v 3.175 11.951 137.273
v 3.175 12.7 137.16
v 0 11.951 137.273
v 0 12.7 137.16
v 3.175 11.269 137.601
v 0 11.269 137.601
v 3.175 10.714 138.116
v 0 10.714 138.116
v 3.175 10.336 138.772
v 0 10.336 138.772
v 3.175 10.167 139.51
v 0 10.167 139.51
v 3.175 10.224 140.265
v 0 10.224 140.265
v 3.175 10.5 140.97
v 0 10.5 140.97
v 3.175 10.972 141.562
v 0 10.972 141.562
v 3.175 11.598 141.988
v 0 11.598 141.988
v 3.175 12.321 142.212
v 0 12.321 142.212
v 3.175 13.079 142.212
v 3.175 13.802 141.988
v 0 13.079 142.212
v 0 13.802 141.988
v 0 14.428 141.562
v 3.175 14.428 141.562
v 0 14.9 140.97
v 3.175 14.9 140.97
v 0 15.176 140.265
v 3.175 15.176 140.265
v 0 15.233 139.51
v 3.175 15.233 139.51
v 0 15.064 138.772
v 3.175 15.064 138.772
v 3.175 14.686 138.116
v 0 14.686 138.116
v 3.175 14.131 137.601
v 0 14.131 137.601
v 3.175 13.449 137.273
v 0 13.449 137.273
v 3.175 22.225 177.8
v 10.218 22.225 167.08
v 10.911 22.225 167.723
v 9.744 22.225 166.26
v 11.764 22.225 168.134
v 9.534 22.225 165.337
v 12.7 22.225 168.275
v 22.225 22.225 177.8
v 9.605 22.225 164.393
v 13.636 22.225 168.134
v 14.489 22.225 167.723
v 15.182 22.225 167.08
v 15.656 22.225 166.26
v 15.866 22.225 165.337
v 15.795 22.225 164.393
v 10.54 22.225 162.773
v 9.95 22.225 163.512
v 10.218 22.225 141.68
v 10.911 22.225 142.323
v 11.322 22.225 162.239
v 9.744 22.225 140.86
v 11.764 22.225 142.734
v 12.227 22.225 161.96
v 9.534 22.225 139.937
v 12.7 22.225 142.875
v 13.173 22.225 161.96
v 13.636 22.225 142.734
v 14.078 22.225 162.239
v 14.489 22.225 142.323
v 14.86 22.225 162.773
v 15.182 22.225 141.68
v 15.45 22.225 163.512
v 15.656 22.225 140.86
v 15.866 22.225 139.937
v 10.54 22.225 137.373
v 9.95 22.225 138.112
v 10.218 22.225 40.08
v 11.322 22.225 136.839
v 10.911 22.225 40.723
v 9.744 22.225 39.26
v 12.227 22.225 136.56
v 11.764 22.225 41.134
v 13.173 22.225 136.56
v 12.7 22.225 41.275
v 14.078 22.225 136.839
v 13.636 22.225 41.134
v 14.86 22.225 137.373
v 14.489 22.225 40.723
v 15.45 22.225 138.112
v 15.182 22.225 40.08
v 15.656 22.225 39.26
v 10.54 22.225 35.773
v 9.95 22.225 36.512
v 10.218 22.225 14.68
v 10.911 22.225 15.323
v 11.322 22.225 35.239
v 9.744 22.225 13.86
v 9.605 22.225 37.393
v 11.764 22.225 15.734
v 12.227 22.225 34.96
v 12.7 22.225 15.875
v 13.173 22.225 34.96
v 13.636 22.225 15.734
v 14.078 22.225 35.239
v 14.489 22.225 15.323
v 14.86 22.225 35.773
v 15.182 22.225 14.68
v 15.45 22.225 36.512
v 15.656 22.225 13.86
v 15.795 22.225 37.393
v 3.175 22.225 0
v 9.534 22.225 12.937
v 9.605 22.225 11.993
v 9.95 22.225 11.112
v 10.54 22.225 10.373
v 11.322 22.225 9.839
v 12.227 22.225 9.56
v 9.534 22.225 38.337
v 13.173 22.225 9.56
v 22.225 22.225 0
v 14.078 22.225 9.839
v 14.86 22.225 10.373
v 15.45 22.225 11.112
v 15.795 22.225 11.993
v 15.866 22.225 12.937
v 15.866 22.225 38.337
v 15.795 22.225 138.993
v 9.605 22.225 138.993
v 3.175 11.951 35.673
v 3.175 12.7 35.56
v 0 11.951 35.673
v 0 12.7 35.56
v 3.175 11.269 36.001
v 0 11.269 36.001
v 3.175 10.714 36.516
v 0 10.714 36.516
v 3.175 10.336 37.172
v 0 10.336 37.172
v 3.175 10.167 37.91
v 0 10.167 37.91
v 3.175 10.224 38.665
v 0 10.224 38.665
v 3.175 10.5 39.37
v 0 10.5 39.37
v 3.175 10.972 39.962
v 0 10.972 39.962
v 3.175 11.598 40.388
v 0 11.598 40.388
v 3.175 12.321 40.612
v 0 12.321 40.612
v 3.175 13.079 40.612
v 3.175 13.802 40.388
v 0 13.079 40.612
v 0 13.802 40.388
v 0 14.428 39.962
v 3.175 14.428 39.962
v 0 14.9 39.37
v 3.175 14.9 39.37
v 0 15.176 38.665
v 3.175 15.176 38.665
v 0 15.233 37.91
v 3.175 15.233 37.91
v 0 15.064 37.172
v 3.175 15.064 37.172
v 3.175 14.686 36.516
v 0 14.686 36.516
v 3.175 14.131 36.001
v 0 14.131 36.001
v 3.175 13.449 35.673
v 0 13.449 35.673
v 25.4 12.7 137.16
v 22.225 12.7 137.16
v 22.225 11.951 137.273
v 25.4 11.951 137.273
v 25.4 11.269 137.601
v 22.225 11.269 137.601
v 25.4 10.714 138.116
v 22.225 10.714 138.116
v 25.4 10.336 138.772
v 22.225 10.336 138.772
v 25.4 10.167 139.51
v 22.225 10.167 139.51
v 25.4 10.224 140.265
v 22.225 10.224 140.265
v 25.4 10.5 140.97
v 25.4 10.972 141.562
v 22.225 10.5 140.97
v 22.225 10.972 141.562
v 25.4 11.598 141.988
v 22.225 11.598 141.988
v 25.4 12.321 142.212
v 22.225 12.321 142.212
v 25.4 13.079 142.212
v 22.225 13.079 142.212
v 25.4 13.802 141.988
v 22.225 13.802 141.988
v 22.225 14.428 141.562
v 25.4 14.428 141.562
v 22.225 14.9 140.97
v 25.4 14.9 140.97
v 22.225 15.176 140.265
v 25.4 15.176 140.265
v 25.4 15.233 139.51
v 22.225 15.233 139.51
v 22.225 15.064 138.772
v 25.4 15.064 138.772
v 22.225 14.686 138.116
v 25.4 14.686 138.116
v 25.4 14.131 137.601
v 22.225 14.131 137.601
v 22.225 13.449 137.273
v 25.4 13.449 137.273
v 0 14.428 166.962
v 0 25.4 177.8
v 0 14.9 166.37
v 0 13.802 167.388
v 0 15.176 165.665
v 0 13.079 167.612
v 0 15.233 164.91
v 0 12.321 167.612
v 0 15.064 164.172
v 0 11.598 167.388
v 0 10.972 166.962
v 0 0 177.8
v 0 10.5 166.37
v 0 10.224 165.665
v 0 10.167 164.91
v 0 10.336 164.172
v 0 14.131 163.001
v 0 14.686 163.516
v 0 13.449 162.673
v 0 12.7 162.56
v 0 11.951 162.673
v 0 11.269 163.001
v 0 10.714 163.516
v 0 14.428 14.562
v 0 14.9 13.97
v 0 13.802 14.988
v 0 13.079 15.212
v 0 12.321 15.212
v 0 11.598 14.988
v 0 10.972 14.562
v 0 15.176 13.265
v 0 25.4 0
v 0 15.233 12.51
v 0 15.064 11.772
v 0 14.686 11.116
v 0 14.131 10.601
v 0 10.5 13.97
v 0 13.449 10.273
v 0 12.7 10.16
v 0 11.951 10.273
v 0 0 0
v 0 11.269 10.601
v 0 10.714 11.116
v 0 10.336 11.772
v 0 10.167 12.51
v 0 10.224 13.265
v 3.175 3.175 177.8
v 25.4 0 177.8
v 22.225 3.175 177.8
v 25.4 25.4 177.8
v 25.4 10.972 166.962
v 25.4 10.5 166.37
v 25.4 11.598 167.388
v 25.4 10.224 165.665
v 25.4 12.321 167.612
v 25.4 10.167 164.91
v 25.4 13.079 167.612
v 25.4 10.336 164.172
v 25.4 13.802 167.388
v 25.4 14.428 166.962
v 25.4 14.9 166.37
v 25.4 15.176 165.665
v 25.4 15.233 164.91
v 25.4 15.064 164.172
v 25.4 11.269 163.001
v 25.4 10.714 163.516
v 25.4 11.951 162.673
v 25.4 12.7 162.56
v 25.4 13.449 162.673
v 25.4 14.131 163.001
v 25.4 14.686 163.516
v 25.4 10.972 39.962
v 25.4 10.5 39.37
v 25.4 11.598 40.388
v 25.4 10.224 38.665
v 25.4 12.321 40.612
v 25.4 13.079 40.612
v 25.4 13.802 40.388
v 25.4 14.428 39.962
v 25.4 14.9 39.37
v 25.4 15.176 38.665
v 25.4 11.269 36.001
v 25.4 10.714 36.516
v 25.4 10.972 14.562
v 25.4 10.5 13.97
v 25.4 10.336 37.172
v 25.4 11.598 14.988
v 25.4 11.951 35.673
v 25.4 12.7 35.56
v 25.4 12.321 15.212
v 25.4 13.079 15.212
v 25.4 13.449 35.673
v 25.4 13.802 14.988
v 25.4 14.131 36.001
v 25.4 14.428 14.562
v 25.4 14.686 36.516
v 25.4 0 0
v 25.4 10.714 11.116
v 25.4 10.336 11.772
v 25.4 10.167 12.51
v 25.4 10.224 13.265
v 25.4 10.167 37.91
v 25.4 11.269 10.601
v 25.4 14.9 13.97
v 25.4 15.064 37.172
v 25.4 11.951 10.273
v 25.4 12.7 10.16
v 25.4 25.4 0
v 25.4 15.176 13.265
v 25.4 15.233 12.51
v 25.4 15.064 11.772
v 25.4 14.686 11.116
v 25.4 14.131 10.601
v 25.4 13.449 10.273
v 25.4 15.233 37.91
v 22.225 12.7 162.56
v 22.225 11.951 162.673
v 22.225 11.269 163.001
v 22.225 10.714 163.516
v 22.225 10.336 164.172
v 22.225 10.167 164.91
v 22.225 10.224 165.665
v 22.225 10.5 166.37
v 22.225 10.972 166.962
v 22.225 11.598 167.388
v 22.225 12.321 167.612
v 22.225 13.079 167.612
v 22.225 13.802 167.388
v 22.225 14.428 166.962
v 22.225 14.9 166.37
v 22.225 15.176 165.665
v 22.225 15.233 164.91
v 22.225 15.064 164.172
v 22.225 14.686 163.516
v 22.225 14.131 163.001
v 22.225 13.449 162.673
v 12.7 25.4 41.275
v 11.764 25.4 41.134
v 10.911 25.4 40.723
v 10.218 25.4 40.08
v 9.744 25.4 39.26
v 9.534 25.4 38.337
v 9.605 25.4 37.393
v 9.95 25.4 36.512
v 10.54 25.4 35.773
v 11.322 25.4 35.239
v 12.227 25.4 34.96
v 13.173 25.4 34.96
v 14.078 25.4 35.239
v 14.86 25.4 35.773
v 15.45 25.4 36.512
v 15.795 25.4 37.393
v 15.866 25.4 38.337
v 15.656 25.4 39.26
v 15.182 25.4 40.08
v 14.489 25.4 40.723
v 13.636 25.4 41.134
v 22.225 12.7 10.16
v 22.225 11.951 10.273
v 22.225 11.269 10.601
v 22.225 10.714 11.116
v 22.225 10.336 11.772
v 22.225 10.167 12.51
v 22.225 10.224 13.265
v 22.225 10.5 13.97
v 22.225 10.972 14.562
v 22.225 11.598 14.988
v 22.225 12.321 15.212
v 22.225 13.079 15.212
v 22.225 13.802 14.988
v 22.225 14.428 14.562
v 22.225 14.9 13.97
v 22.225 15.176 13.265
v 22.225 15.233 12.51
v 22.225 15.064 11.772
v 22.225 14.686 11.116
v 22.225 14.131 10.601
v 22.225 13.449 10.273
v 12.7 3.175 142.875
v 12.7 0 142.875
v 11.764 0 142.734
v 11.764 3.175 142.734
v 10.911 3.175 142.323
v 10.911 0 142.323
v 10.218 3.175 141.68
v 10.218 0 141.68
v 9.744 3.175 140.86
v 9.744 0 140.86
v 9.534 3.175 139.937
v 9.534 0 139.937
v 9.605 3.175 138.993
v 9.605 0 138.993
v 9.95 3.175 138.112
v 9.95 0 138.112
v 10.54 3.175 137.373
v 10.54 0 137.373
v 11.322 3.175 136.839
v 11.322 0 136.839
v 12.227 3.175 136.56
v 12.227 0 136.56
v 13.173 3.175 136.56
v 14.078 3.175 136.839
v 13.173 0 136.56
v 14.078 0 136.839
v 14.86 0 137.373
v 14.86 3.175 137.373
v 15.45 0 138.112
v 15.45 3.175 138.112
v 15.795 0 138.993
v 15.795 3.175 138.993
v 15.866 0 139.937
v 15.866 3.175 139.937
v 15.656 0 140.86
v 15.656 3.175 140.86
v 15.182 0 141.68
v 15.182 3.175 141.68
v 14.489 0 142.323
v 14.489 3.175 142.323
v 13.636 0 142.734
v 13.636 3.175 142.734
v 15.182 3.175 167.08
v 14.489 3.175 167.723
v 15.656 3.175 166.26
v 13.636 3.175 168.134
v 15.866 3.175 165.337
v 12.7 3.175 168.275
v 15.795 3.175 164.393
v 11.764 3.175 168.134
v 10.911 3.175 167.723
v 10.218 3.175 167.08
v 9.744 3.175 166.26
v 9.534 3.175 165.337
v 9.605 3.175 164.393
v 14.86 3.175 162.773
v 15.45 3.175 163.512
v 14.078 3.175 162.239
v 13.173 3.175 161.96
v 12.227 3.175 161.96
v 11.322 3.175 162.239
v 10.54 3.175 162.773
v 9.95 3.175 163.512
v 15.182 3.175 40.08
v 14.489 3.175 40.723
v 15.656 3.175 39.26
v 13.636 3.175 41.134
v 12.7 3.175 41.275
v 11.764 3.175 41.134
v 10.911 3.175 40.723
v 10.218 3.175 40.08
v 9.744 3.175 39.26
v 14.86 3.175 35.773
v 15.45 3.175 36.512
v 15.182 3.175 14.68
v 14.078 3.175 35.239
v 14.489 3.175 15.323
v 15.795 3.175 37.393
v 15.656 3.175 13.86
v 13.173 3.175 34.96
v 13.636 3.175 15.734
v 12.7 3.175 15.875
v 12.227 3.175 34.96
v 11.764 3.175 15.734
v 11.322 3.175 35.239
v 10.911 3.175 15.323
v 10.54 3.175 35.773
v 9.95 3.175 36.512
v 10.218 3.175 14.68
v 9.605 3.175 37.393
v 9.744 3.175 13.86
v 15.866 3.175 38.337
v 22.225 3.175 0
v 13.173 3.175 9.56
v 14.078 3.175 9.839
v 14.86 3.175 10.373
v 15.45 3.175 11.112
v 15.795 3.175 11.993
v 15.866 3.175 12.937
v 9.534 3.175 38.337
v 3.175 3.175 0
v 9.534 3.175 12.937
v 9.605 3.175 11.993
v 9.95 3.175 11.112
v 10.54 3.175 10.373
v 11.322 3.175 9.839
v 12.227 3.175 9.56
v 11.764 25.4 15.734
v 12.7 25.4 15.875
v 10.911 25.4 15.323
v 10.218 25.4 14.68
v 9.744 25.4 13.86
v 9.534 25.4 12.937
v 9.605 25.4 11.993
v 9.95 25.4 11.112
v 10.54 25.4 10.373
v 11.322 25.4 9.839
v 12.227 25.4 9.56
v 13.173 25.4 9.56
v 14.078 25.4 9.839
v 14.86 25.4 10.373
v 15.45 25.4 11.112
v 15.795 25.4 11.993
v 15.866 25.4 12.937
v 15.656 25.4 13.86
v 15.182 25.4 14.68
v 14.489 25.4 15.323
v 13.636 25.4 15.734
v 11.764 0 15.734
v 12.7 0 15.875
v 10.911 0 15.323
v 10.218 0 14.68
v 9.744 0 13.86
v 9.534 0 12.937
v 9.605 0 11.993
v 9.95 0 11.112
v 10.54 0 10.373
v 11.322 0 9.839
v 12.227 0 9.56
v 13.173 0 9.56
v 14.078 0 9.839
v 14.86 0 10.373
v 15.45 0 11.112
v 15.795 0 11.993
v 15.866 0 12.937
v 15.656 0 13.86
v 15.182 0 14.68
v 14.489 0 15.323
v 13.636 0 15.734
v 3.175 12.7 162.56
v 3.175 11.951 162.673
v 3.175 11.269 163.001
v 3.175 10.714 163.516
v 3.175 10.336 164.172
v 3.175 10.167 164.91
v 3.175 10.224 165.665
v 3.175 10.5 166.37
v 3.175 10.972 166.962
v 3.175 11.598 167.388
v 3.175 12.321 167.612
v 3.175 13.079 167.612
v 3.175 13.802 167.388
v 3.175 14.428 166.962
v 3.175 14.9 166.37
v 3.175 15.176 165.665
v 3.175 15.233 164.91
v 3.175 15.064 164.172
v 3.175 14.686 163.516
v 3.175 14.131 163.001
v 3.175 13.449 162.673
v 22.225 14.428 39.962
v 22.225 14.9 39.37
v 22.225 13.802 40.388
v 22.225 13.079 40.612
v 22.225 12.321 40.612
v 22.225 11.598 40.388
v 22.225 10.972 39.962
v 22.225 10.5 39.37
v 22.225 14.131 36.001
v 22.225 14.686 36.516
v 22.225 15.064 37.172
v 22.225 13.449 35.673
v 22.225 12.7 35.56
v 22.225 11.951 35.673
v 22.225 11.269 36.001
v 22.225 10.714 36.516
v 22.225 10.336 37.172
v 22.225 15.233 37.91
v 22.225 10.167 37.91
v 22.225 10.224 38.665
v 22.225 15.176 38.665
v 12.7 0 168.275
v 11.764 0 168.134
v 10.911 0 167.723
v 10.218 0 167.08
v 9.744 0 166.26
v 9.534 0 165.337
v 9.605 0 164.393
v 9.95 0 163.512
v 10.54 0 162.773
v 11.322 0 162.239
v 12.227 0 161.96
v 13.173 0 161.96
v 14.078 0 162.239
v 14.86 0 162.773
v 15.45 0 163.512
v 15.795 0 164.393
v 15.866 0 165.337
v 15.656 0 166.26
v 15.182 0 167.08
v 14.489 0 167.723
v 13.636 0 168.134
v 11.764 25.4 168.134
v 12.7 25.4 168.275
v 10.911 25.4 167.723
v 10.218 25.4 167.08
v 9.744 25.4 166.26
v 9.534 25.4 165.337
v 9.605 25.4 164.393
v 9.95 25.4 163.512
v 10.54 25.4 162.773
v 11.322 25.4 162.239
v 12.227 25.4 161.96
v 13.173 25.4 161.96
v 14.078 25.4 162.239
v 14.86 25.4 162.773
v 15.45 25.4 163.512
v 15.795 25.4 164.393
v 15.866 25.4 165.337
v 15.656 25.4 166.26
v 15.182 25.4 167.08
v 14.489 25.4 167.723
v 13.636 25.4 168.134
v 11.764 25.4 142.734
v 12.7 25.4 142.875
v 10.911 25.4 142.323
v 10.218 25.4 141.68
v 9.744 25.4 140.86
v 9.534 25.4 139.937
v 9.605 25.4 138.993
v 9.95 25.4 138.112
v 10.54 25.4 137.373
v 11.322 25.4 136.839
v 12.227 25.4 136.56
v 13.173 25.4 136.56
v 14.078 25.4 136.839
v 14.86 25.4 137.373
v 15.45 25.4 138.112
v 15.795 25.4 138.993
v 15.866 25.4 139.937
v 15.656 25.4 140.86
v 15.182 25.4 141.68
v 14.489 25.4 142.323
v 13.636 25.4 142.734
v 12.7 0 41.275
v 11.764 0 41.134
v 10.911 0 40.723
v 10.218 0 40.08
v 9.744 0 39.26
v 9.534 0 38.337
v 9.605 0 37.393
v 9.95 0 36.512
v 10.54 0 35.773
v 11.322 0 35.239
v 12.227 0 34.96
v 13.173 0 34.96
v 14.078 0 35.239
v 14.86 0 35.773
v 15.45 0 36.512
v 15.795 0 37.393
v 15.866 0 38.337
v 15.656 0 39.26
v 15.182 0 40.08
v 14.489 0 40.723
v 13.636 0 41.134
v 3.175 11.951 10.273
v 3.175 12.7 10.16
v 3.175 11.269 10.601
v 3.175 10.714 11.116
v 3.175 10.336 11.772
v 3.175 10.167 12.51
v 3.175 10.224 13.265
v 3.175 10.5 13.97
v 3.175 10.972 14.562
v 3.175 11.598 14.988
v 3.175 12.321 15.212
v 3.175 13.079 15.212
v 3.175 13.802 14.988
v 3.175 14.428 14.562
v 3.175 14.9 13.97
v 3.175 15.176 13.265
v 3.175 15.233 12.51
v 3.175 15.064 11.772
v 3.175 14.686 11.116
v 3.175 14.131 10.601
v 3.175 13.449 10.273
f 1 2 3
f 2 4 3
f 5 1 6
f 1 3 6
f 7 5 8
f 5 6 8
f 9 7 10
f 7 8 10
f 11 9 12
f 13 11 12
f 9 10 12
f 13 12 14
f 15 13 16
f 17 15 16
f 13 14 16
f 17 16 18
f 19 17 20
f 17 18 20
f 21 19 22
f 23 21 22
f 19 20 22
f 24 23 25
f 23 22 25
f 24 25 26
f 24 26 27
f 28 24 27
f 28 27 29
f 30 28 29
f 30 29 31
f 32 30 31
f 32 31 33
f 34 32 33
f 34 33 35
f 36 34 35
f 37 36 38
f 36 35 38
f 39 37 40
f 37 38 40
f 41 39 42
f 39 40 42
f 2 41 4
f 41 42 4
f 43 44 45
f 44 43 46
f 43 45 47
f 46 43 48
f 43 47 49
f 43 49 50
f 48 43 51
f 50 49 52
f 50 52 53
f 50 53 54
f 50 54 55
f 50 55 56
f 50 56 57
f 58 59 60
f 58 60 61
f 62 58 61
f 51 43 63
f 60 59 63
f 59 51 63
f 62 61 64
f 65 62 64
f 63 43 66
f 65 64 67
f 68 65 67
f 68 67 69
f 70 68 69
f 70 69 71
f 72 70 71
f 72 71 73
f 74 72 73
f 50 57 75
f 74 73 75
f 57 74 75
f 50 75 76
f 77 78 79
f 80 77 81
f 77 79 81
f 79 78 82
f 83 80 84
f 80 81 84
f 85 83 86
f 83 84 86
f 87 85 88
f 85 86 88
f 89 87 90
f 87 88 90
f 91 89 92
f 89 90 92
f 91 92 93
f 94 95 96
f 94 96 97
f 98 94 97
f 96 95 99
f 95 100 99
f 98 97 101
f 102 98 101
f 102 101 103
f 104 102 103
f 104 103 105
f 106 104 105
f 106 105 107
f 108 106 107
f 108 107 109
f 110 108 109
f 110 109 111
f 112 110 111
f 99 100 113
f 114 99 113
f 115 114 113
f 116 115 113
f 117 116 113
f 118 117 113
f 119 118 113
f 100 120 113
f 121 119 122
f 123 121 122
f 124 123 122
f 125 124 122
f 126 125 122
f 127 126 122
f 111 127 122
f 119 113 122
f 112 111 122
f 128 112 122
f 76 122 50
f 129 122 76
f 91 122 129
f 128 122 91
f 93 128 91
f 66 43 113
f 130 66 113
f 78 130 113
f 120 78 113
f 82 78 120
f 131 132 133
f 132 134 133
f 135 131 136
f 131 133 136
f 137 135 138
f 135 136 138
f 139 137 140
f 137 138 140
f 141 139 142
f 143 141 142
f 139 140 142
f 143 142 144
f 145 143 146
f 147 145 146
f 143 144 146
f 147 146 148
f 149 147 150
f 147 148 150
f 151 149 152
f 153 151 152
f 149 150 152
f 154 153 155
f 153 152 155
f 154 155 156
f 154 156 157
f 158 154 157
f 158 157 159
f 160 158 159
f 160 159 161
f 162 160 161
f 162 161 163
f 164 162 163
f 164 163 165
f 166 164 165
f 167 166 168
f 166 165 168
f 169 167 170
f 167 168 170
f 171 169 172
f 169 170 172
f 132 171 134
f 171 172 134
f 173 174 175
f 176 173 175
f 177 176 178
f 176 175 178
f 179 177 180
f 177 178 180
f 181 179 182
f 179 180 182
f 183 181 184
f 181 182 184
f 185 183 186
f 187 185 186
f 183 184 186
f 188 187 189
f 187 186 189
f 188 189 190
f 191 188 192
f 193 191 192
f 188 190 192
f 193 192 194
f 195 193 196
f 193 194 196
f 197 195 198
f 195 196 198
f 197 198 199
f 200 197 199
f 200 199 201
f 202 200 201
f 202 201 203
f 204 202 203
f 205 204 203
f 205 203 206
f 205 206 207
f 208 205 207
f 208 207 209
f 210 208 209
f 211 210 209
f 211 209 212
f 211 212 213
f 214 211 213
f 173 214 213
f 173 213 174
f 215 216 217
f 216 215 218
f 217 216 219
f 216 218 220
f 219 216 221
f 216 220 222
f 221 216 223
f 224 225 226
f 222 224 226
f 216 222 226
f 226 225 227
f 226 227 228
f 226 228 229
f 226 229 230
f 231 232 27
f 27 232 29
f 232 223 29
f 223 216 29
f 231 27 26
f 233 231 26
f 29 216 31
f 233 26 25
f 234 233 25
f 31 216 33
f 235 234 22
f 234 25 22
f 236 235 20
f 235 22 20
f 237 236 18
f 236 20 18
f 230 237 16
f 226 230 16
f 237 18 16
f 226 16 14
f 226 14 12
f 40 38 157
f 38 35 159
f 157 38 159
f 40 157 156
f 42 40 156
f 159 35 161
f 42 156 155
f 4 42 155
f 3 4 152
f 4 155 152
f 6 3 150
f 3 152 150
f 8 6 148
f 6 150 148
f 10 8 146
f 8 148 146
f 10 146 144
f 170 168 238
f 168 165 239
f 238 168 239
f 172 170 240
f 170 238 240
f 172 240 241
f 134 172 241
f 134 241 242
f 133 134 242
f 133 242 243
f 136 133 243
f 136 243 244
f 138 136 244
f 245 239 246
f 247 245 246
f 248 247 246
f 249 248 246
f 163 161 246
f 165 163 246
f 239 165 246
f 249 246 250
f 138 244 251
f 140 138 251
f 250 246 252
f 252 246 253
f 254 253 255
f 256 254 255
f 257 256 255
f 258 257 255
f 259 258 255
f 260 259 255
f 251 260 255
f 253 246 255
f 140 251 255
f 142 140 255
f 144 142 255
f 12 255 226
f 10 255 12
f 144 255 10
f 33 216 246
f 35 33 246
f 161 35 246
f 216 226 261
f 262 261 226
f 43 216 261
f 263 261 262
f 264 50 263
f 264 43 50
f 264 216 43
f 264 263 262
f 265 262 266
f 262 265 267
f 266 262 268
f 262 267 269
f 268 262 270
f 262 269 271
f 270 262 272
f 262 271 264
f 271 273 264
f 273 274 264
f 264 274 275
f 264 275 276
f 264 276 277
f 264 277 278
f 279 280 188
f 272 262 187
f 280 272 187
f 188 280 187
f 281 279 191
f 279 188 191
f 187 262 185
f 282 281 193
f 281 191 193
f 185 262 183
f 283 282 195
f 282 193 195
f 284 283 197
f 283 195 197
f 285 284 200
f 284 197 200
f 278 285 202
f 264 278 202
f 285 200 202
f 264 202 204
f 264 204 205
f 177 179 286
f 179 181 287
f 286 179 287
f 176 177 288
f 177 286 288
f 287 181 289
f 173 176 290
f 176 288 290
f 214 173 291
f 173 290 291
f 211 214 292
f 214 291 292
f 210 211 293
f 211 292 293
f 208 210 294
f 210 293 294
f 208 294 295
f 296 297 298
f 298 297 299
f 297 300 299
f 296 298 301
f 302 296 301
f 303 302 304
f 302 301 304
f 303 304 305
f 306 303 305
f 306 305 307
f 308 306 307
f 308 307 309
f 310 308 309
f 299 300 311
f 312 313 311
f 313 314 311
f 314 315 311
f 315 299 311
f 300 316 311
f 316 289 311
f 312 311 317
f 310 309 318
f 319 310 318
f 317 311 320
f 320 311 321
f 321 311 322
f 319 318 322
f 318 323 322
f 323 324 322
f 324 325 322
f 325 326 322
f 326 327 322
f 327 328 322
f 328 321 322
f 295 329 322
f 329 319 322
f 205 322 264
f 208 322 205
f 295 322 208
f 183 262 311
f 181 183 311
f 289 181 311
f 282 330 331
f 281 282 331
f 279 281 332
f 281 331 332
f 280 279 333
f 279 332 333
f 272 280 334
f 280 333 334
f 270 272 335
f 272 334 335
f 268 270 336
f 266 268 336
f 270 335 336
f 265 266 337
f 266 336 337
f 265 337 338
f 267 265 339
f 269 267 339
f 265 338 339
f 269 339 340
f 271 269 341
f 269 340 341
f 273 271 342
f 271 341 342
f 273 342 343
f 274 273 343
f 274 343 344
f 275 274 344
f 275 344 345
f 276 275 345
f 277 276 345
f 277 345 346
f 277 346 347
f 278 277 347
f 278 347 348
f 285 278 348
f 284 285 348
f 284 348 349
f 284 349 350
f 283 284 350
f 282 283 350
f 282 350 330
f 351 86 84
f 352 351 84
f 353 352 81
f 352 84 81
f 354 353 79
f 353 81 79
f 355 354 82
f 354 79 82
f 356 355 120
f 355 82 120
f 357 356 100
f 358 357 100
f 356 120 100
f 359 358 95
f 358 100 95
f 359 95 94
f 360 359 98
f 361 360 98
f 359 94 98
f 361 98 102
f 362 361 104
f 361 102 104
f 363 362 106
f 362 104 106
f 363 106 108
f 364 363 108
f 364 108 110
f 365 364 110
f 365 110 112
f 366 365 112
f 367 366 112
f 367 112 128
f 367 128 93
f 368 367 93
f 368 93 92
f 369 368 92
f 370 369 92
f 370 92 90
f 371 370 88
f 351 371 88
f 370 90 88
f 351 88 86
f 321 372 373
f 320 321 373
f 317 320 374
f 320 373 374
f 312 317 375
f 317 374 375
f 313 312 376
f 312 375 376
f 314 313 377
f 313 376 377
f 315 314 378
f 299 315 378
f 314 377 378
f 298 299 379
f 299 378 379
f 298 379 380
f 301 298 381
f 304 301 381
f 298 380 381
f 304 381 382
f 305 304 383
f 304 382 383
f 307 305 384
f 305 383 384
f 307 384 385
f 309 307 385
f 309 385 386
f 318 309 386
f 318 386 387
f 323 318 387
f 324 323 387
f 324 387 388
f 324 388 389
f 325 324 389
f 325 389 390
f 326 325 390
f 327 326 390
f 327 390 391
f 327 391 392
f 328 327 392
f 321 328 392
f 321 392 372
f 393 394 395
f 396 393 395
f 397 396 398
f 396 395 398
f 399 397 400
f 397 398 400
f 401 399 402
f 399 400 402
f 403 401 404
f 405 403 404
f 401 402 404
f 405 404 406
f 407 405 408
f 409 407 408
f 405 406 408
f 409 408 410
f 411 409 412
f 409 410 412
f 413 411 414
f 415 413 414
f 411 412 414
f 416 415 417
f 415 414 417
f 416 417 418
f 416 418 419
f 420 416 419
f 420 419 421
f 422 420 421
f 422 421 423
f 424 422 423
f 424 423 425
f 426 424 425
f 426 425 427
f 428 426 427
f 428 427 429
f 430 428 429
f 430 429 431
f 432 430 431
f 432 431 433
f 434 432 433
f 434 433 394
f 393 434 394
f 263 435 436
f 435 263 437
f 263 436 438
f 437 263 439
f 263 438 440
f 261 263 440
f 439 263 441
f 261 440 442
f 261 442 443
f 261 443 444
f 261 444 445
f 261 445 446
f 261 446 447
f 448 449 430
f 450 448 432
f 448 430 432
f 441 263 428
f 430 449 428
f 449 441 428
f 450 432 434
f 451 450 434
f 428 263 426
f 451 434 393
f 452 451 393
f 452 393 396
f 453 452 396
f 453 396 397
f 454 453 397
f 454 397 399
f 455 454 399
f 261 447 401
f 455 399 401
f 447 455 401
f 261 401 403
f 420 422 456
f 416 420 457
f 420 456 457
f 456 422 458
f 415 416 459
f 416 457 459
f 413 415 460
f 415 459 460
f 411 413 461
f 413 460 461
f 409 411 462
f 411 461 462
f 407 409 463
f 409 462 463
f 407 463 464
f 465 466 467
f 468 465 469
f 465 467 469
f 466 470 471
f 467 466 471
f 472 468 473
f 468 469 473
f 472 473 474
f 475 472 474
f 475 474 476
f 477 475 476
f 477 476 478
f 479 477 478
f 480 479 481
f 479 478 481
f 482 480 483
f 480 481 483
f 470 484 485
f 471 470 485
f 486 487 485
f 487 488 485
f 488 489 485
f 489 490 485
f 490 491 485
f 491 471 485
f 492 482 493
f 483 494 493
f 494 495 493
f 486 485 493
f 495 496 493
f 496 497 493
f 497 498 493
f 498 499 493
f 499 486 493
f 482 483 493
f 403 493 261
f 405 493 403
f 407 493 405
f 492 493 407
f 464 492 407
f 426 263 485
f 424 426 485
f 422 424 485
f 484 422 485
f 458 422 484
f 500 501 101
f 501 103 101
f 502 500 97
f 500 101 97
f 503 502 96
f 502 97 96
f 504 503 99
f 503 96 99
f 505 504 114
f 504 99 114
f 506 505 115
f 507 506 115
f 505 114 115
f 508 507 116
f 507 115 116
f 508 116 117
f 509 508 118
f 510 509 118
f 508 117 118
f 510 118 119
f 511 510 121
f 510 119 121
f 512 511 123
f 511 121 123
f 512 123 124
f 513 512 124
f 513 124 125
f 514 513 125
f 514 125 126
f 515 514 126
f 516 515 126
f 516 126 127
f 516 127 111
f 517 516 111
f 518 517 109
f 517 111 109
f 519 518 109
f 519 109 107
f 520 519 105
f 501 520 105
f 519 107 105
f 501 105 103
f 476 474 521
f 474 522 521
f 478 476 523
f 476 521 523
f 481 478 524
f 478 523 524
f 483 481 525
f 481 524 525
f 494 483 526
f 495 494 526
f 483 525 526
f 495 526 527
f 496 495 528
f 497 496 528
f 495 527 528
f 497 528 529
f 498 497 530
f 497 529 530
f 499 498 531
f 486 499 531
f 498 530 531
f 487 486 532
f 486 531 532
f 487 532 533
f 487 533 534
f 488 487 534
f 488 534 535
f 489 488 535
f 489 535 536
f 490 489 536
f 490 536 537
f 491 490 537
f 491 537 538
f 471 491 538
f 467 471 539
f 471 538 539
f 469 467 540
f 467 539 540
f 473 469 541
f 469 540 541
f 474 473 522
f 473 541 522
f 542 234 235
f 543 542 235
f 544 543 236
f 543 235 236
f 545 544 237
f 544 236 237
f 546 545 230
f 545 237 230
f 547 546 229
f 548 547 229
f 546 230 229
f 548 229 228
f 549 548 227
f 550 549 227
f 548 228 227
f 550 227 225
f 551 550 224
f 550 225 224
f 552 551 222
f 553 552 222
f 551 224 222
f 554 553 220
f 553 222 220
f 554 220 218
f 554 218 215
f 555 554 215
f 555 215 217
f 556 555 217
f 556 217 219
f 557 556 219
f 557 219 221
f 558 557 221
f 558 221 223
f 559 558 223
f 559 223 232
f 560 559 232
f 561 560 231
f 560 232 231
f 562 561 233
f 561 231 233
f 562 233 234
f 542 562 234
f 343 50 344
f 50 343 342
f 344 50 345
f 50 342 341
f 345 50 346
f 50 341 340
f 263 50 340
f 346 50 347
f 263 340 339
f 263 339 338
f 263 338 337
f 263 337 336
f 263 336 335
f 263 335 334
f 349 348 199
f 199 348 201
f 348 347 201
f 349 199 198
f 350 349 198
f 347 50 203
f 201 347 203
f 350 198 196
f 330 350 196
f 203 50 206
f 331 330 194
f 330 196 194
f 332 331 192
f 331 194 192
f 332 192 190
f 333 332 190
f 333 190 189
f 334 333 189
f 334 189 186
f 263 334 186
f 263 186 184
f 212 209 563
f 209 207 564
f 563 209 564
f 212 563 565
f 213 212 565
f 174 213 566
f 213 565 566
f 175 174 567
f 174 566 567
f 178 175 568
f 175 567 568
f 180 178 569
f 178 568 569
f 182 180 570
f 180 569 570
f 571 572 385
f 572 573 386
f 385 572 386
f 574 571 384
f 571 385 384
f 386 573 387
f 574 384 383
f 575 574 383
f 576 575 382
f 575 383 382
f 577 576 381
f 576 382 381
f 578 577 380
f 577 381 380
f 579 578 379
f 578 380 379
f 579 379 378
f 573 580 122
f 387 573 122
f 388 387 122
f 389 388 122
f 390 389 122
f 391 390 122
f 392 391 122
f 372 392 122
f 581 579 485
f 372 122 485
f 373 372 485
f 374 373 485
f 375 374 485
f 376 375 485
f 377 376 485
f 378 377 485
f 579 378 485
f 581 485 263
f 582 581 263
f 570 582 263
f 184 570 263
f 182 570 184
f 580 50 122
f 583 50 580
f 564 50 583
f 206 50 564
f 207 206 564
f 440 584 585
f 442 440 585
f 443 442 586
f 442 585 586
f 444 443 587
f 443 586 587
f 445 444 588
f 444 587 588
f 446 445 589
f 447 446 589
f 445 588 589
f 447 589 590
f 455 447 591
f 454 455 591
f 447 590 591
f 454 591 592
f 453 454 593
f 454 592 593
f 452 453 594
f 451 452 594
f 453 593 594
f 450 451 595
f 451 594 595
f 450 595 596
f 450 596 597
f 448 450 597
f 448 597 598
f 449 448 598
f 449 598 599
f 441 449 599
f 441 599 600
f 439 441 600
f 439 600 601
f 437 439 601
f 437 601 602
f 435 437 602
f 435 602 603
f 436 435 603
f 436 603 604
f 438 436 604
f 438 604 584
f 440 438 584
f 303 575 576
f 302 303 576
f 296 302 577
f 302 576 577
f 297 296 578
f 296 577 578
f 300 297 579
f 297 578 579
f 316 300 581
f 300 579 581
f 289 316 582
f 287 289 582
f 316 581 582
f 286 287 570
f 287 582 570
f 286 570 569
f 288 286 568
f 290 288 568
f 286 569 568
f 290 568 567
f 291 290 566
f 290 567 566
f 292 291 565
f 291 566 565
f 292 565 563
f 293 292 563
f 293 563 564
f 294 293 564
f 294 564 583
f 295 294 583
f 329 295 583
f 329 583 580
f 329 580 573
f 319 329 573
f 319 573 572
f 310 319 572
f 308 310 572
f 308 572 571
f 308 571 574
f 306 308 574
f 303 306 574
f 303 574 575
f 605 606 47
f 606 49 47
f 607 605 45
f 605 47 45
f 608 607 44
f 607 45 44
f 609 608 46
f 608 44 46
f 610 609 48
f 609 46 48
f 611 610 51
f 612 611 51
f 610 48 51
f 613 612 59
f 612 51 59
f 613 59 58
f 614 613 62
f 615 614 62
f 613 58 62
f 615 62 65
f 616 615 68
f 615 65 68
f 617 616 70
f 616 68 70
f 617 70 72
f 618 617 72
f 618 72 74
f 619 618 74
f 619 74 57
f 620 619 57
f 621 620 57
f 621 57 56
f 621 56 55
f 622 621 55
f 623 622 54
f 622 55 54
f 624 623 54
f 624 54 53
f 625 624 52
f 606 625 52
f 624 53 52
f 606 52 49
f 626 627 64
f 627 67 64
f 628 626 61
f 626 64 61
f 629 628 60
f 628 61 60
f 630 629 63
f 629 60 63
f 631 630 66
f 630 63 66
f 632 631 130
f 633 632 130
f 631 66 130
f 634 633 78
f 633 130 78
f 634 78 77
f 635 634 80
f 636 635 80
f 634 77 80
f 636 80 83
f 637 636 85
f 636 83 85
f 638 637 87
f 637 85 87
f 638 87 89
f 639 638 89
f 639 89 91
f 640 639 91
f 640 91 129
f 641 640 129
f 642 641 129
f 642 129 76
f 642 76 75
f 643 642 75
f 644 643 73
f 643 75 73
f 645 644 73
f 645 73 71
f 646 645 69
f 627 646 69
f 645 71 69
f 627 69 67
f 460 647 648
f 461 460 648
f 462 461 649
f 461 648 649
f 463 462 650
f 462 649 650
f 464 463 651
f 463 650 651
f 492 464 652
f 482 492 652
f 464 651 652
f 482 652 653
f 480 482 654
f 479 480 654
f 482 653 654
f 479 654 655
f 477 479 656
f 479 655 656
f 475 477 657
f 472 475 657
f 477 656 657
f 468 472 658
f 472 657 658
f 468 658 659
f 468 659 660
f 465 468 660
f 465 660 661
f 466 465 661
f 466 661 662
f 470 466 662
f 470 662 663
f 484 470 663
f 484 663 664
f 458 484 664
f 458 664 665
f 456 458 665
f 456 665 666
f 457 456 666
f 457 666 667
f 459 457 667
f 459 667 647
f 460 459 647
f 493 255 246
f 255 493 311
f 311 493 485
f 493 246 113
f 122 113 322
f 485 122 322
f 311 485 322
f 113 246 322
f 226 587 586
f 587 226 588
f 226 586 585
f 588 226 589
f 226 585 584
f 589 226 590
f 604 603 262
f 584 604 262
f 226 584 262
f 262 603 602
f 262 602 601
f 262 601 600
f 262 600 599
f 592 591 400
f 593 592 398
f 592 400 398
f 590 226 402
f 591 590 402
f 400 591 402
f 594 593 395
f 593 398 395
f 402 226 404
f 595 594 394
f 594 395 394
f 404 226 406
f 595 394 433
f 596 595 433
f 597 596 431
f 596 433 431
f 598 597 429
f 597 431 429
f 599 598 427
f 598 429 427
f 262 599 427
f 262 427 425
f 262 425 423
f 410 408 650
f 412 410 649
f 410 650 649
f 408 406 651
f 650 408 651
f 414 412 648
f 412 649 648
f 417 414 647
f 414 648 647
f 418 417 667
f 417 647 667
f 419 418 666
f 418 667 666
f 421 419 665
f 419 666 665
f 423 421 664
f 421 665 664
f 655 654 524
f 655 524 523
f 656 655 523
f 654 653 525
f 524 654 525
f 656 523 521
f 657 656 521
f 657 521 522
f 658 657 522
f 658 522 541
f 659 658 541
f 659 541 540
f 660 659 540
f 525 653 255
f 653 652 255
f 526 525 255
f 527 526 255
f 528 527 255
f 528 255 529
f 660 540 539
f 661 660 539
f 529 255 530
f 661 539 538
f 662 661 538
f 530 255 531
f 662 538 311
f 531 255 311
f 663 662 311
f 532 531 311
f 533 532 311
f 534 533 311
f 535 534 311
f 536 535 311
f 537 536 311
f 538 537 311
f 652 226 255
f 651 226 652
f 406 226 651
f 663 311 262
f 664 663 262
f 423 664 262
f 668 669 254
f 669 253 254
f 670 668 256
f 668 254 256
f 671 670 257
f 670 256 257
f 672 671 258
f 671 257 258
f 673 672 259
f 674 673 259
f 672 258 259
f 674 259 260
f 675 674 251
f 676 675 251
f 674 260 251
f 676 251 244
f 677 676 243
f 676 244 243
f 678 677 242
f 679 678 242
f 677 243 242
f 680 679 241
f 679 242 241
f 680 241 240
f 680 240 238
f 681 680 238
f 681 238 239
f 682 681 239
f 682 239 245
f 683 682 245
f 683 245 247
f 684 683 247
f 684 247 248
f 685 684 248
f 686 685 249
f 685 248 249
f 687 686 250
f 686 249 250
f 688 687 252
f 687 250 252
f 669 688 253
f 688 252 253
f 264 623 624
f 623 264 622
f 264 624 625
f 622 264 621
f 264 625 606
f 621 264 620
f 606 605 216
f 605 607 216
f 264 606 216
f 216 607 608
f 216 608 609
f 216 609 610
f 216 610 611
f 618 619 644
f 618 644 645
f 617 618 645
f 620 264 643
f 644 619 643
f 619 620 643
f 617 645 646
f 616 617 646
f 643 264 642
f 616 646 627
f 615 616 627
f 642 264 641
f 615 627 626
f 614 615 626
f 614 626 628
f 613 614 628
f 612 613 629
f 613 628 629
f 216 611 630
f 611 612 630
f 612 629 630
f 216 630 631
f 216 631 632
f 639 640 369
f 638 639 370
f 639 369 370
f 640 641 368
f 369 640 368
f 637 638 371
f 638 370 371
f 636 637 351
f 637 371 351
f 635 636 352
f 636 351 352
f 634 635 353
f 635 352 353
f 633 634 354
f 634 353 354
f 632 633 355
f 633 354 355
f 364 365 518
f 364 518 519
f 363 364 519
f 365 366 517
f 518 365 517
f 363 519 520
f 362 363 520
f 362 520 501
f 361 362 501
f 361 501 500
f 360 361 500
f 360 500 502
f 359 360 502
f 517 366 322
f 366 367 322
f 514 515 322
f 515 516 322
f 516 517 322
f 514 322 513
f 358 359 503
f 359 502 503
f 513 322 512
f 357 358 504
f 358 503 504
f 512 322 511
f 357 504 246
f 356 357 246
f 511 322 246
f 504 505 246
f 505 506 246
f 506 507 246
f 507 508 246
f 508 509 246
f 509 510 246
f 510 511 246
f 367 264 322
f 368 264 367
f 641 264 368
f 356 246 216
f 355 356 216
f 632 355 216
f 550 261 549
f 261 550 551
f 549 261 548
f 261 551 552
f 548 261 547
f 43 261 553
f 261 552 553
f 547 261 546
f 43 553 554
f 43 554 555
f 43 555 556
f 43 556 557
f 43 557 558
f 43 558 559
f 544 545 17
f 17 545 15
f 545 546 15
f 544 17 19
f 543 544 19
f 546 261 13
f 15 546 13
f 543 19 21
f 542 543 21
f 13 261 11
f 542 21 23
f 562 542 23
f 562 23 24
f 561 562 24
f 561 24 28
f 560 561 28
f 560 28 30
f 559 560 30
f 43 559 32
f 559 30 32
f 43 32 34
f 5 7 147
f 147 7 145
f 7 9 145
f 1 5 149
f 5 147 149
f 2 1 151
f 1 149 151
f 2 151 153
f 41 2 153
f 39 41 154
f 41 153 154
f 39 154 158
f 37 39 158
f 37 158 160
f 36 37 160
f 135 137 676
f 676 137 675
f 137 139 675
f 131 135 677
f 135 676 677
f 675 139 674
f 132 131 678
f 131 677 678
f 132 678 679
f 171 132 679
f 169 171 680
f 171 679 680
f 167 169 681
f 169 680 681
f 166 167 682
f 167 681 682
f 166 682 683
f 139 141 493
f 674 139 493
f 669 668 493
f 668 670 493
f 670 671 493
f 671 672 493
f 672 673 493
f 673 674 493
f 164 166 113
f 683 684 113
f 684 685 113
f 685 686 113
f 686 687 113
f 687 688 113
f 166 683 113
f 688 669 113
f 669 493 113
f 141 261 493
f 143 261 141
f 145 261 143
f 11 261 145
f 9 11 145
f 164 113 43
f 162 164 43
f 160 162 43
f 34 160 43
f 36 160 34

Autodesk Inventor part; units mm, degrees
ref_plane "YZ Plane" through (0, 0, 0) normal (1, 0, 0) x (0, 1, 0)
ref_plane "XZ Plane" through (0, 0, 0) normal (0, 1, 0) x (-1, 0, 0)
ref_plane "XY Plane" through (0, 0, 0) normal (0, 0, 1) x (1, 0, 0)
sketch "Sketch1" plane through (0, 0, 0) normal (0, 0, 1) x (1, 0, 0)
  line L0 (0, 0) -> (25.4, 0)
  line L1 (25.4, 0) -> (25.4, 25.4)
  line L2 (25.4, 25.4) -> (0, 25.4)
  line L3 (0, 25.4) -> (0, 0)
  line L4 (22.225, 22.225) -> (22.225, 3.175)
  line L5 (22.225, 3.175) -> (3.175, 3.175)
  line L6 (3.175, 3.175) -> (3.175, 22.225)
  line L7 (3.175, 22.225) -> (22.225, 22.225)
  dimension "d0" = 25.4
  dimension "d1" = 25.4
  dimension "d2" = 3.175
extrude "Extrusion1" add sketch "Sketch1" along normal blind 177.8
sketch "Sketch2" plane through (0, 25.4, 0) normal (0, 1, 0) x (1, 0, 0)
  line L0 (25.4, 0) -> (25.4, -177.8) projected
  line L1 (25.4, -177.8) -> (0, -177.8) projected
  line L2 (25.4, 0) -> (0, 0) projected
  line L3 (0, 0) -> (0, -177.8) projected
  point P0 (12.7, -165.1)
  point P1 (12.7, -12.7)
  dimension "d5" = 12.7
  dimension "d6" = 12.7
  dimension "d7" = 12.7
  dimension "d8" = 12.7
hole "Hole1" at (12.7, 25.4, 165.1) at (12.7, 25.4, 12.7) direction (0, -1, 0) diameter 6.35 end through all
pattern_linear "Rectangular Pattern1" count 2 spacing 25.4 along (0, 0, 1) count 2 spacing 25.4 along (0, 0, -1) of "Hole1"
sketch "Sketch4" plane through (25.4, 0, 0) normal (1, 0, 0) x (0, 0, -1)
  line L0 (0, 25.4) -> (-177.8, 25.4) projected
  line L1 (-177.8, 0) -> (-177.8, 25.4) projected
  line L2 (0, 0) -> (0, 25.4) projected
  point P0 (-165.1, 12.7)
  point P1 (-12.7, 12.7)
  dimension "d31" = 12.7
  dimension "d32" = 12.7
  dimension "d33" = 12.7
  dimension "d34" = 12.7
hole "Hole3" at (25.4, 12.7, 165.1) at (25.4, 12.7, 12.7) direction (-1, 0, 0) diameter 5.08 end through all
pattern_linear "Rectangular Pattern2" count 2 spacing 25.4 along (0, 0, -1) count 2 spacing 25.4 along (0, 0, 1) of "Hole3"
equation "\"d0\" = d1"
properties part number "testRoboRescue_Chassis_Frame_lengthBar" material "Aluminum 6061"
